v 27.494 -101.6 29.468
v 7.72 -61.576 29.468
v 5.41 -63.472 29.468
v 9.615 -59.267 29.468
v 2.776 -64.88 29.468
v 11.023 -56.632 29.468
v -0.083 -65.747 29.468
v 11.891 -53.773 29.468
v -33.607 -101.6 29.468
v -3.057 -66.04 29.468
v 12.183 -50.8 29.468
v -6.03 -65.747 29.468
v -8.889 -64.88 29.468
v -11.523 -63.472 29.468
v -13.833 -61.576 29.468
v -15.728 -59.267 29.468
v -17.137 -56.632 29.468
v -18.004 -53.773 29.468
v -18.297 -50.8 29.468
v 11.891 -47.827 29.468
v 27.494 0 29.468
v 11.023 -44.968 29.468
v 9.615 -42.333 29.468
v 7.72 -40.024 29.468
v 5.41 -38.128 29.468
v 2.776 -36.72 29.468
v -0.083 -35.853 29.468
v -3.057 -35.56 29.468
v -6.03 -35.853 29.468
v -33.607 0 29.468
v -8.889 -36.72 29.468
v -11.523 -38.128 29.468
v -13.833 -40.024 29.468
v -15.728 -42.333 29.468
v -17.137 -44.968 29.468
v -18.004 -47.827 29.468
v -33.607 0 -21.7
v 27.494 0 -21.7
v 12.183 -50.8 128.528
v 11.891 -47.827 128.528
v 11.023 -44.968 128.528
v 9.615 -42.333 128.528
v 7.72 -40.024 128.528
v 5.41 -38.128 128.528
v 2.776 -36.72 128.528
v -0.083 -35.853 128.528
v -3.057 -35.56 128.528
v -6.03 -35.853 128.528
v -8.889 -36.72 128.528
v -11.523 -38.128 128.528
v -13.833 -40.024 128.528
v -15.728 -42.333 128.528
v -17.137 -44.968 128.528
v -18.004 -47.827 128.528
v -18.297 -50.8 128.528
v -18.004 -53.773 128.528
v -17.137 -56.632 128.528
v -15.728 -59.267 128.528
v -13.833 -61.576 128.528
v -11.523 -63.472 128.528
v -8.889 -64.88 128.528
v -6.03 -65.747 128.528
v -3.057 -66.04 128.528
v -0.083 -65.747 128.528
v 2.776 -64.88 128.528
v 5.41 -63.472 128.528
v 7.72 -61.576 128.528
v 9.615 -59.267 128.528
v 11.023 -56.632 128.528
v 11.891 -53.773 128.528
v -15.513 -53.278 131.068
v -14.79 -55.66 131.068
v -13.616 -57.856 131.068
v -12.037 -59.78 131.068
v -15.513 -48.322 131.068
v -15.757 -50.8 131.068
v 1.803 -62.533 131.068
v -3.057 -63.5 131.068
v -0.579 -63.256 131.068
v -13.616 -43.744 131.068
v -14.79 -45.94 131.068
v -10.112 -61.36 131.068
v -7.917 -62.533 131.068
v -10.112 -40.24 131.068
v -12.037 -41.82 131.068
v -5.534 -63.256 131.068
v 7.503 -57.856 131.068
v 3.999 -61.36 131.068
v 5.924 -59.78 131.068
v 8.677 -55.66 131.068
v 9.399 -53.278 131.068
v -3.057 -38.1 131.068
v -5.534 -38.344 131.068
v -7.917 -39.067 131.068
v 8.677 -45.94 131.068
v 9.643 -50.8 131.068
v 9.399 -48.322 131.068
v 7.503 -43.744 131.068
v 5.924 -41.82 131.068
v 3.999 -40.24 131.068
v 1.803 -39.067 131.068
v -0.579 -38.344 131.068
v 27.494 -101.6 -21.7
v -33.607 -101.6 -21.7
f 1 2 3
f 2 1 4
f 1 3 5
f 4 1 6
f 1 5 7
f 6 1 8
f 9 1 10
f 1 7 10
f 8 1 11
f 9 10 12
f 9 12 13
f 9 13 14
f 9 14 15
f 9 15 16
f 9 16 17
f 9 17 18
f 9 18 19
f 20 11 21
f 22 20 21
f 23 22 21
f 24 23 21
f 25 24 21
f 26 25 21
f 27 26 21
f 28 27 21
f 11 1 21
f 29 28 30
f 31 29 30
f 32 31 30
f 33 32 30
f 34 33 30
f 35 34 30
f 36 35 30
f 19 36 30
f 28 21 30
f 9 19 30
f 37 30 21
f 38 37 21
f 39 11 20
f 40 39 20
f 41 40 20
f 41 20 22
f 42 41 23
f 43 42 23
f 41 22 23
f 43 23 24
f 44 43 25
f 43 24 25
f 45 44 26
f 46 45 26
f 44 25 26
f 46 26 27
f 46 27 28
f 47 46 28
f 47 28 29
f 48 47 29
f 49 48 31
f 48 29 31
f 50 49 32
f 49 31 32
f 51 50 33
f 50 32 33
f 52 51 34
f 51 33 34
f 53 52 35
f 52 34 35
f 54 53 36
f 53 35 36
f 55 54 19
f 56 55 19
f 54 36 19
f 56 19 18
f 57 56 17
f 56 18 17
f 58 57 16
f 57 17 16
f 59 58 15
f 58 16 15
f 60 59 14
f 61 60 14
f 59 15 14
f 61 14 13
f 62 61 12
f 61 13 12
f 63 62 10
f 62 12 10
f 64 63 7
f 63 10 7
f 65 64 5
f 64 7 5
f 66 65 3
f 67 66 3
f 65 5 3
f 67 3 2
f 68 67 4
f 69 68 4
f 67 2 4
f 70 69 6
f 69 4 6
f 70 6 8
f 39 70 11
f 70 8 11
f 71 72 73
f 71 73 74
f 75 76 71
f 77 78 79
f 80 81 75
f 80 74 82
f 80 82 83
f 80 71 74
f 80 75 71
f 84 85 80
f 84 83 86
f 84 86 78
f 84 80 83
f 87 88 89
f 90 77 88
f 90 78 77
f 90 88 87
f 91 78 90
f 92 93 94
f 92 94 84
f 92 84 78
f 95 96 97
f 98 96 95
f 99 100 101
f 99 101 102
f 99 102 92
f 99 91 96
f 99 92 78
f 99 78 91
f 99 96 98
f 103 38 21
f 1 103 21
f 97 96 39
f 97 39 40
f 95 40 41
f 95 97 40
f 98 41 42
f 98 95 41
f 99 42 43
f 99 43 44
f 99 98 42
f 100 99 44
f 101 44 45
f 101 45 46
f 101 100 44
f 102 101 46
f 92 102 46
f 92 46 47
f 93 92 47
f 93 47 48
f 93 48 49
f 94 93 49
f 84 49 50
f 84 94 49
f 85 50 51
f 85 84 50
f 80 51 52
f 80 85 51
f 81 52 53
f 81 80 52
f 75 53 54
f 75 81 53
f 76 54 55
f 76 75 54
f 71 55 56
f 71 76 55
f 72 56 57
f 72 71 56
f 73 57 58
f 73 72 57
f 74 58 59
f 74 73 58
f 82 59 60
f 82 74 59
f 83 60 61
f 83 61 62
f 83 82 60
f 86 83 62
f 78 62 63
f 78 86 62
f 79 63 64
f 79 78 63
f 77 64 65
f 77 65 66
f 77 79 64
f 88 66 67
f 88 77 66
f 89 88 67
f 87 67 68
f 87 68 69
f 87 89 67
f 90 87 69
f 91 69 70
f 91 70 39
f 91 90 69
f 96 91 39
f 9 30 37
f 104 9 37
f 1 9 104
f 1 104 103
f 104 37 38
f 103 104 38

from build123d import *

# Parameters (mm, degrees)
F1_DEPTH = 101.6
F2_R     = 15.24
F3_DEPTH = 101.6
F4_SIZE  = 2.54


with BuildPart() as f1:
    # F0 (on Front) → F1 (new body)
    with BuildSketch(Plane.XZ):
        Polygon((27.494166, 29.467992), (0, 29.467992), (-33.607345, 29.467992), (-33.607345, -21.700272), (27.494166, -21.700272), align=None)
    extrude(amount=F1_DEPTH)

    # F2 (on face) → F3 (join)
    with BuildSketch(Plane.XY.offset(29.467992)):
        with Locations((-3.05659, -50.8)):
            Circle(F2_R)
    extrude(amount=F3_DEPTH)

    # F4
    f4_edges = [f1.edges().sort_by_distance(p)[0] for p in [
        (-18.29659, -50.8, 131.067992),
    ]]
    chamfer(f4_edges, length=F4_SIZE)


solid = f1.part
